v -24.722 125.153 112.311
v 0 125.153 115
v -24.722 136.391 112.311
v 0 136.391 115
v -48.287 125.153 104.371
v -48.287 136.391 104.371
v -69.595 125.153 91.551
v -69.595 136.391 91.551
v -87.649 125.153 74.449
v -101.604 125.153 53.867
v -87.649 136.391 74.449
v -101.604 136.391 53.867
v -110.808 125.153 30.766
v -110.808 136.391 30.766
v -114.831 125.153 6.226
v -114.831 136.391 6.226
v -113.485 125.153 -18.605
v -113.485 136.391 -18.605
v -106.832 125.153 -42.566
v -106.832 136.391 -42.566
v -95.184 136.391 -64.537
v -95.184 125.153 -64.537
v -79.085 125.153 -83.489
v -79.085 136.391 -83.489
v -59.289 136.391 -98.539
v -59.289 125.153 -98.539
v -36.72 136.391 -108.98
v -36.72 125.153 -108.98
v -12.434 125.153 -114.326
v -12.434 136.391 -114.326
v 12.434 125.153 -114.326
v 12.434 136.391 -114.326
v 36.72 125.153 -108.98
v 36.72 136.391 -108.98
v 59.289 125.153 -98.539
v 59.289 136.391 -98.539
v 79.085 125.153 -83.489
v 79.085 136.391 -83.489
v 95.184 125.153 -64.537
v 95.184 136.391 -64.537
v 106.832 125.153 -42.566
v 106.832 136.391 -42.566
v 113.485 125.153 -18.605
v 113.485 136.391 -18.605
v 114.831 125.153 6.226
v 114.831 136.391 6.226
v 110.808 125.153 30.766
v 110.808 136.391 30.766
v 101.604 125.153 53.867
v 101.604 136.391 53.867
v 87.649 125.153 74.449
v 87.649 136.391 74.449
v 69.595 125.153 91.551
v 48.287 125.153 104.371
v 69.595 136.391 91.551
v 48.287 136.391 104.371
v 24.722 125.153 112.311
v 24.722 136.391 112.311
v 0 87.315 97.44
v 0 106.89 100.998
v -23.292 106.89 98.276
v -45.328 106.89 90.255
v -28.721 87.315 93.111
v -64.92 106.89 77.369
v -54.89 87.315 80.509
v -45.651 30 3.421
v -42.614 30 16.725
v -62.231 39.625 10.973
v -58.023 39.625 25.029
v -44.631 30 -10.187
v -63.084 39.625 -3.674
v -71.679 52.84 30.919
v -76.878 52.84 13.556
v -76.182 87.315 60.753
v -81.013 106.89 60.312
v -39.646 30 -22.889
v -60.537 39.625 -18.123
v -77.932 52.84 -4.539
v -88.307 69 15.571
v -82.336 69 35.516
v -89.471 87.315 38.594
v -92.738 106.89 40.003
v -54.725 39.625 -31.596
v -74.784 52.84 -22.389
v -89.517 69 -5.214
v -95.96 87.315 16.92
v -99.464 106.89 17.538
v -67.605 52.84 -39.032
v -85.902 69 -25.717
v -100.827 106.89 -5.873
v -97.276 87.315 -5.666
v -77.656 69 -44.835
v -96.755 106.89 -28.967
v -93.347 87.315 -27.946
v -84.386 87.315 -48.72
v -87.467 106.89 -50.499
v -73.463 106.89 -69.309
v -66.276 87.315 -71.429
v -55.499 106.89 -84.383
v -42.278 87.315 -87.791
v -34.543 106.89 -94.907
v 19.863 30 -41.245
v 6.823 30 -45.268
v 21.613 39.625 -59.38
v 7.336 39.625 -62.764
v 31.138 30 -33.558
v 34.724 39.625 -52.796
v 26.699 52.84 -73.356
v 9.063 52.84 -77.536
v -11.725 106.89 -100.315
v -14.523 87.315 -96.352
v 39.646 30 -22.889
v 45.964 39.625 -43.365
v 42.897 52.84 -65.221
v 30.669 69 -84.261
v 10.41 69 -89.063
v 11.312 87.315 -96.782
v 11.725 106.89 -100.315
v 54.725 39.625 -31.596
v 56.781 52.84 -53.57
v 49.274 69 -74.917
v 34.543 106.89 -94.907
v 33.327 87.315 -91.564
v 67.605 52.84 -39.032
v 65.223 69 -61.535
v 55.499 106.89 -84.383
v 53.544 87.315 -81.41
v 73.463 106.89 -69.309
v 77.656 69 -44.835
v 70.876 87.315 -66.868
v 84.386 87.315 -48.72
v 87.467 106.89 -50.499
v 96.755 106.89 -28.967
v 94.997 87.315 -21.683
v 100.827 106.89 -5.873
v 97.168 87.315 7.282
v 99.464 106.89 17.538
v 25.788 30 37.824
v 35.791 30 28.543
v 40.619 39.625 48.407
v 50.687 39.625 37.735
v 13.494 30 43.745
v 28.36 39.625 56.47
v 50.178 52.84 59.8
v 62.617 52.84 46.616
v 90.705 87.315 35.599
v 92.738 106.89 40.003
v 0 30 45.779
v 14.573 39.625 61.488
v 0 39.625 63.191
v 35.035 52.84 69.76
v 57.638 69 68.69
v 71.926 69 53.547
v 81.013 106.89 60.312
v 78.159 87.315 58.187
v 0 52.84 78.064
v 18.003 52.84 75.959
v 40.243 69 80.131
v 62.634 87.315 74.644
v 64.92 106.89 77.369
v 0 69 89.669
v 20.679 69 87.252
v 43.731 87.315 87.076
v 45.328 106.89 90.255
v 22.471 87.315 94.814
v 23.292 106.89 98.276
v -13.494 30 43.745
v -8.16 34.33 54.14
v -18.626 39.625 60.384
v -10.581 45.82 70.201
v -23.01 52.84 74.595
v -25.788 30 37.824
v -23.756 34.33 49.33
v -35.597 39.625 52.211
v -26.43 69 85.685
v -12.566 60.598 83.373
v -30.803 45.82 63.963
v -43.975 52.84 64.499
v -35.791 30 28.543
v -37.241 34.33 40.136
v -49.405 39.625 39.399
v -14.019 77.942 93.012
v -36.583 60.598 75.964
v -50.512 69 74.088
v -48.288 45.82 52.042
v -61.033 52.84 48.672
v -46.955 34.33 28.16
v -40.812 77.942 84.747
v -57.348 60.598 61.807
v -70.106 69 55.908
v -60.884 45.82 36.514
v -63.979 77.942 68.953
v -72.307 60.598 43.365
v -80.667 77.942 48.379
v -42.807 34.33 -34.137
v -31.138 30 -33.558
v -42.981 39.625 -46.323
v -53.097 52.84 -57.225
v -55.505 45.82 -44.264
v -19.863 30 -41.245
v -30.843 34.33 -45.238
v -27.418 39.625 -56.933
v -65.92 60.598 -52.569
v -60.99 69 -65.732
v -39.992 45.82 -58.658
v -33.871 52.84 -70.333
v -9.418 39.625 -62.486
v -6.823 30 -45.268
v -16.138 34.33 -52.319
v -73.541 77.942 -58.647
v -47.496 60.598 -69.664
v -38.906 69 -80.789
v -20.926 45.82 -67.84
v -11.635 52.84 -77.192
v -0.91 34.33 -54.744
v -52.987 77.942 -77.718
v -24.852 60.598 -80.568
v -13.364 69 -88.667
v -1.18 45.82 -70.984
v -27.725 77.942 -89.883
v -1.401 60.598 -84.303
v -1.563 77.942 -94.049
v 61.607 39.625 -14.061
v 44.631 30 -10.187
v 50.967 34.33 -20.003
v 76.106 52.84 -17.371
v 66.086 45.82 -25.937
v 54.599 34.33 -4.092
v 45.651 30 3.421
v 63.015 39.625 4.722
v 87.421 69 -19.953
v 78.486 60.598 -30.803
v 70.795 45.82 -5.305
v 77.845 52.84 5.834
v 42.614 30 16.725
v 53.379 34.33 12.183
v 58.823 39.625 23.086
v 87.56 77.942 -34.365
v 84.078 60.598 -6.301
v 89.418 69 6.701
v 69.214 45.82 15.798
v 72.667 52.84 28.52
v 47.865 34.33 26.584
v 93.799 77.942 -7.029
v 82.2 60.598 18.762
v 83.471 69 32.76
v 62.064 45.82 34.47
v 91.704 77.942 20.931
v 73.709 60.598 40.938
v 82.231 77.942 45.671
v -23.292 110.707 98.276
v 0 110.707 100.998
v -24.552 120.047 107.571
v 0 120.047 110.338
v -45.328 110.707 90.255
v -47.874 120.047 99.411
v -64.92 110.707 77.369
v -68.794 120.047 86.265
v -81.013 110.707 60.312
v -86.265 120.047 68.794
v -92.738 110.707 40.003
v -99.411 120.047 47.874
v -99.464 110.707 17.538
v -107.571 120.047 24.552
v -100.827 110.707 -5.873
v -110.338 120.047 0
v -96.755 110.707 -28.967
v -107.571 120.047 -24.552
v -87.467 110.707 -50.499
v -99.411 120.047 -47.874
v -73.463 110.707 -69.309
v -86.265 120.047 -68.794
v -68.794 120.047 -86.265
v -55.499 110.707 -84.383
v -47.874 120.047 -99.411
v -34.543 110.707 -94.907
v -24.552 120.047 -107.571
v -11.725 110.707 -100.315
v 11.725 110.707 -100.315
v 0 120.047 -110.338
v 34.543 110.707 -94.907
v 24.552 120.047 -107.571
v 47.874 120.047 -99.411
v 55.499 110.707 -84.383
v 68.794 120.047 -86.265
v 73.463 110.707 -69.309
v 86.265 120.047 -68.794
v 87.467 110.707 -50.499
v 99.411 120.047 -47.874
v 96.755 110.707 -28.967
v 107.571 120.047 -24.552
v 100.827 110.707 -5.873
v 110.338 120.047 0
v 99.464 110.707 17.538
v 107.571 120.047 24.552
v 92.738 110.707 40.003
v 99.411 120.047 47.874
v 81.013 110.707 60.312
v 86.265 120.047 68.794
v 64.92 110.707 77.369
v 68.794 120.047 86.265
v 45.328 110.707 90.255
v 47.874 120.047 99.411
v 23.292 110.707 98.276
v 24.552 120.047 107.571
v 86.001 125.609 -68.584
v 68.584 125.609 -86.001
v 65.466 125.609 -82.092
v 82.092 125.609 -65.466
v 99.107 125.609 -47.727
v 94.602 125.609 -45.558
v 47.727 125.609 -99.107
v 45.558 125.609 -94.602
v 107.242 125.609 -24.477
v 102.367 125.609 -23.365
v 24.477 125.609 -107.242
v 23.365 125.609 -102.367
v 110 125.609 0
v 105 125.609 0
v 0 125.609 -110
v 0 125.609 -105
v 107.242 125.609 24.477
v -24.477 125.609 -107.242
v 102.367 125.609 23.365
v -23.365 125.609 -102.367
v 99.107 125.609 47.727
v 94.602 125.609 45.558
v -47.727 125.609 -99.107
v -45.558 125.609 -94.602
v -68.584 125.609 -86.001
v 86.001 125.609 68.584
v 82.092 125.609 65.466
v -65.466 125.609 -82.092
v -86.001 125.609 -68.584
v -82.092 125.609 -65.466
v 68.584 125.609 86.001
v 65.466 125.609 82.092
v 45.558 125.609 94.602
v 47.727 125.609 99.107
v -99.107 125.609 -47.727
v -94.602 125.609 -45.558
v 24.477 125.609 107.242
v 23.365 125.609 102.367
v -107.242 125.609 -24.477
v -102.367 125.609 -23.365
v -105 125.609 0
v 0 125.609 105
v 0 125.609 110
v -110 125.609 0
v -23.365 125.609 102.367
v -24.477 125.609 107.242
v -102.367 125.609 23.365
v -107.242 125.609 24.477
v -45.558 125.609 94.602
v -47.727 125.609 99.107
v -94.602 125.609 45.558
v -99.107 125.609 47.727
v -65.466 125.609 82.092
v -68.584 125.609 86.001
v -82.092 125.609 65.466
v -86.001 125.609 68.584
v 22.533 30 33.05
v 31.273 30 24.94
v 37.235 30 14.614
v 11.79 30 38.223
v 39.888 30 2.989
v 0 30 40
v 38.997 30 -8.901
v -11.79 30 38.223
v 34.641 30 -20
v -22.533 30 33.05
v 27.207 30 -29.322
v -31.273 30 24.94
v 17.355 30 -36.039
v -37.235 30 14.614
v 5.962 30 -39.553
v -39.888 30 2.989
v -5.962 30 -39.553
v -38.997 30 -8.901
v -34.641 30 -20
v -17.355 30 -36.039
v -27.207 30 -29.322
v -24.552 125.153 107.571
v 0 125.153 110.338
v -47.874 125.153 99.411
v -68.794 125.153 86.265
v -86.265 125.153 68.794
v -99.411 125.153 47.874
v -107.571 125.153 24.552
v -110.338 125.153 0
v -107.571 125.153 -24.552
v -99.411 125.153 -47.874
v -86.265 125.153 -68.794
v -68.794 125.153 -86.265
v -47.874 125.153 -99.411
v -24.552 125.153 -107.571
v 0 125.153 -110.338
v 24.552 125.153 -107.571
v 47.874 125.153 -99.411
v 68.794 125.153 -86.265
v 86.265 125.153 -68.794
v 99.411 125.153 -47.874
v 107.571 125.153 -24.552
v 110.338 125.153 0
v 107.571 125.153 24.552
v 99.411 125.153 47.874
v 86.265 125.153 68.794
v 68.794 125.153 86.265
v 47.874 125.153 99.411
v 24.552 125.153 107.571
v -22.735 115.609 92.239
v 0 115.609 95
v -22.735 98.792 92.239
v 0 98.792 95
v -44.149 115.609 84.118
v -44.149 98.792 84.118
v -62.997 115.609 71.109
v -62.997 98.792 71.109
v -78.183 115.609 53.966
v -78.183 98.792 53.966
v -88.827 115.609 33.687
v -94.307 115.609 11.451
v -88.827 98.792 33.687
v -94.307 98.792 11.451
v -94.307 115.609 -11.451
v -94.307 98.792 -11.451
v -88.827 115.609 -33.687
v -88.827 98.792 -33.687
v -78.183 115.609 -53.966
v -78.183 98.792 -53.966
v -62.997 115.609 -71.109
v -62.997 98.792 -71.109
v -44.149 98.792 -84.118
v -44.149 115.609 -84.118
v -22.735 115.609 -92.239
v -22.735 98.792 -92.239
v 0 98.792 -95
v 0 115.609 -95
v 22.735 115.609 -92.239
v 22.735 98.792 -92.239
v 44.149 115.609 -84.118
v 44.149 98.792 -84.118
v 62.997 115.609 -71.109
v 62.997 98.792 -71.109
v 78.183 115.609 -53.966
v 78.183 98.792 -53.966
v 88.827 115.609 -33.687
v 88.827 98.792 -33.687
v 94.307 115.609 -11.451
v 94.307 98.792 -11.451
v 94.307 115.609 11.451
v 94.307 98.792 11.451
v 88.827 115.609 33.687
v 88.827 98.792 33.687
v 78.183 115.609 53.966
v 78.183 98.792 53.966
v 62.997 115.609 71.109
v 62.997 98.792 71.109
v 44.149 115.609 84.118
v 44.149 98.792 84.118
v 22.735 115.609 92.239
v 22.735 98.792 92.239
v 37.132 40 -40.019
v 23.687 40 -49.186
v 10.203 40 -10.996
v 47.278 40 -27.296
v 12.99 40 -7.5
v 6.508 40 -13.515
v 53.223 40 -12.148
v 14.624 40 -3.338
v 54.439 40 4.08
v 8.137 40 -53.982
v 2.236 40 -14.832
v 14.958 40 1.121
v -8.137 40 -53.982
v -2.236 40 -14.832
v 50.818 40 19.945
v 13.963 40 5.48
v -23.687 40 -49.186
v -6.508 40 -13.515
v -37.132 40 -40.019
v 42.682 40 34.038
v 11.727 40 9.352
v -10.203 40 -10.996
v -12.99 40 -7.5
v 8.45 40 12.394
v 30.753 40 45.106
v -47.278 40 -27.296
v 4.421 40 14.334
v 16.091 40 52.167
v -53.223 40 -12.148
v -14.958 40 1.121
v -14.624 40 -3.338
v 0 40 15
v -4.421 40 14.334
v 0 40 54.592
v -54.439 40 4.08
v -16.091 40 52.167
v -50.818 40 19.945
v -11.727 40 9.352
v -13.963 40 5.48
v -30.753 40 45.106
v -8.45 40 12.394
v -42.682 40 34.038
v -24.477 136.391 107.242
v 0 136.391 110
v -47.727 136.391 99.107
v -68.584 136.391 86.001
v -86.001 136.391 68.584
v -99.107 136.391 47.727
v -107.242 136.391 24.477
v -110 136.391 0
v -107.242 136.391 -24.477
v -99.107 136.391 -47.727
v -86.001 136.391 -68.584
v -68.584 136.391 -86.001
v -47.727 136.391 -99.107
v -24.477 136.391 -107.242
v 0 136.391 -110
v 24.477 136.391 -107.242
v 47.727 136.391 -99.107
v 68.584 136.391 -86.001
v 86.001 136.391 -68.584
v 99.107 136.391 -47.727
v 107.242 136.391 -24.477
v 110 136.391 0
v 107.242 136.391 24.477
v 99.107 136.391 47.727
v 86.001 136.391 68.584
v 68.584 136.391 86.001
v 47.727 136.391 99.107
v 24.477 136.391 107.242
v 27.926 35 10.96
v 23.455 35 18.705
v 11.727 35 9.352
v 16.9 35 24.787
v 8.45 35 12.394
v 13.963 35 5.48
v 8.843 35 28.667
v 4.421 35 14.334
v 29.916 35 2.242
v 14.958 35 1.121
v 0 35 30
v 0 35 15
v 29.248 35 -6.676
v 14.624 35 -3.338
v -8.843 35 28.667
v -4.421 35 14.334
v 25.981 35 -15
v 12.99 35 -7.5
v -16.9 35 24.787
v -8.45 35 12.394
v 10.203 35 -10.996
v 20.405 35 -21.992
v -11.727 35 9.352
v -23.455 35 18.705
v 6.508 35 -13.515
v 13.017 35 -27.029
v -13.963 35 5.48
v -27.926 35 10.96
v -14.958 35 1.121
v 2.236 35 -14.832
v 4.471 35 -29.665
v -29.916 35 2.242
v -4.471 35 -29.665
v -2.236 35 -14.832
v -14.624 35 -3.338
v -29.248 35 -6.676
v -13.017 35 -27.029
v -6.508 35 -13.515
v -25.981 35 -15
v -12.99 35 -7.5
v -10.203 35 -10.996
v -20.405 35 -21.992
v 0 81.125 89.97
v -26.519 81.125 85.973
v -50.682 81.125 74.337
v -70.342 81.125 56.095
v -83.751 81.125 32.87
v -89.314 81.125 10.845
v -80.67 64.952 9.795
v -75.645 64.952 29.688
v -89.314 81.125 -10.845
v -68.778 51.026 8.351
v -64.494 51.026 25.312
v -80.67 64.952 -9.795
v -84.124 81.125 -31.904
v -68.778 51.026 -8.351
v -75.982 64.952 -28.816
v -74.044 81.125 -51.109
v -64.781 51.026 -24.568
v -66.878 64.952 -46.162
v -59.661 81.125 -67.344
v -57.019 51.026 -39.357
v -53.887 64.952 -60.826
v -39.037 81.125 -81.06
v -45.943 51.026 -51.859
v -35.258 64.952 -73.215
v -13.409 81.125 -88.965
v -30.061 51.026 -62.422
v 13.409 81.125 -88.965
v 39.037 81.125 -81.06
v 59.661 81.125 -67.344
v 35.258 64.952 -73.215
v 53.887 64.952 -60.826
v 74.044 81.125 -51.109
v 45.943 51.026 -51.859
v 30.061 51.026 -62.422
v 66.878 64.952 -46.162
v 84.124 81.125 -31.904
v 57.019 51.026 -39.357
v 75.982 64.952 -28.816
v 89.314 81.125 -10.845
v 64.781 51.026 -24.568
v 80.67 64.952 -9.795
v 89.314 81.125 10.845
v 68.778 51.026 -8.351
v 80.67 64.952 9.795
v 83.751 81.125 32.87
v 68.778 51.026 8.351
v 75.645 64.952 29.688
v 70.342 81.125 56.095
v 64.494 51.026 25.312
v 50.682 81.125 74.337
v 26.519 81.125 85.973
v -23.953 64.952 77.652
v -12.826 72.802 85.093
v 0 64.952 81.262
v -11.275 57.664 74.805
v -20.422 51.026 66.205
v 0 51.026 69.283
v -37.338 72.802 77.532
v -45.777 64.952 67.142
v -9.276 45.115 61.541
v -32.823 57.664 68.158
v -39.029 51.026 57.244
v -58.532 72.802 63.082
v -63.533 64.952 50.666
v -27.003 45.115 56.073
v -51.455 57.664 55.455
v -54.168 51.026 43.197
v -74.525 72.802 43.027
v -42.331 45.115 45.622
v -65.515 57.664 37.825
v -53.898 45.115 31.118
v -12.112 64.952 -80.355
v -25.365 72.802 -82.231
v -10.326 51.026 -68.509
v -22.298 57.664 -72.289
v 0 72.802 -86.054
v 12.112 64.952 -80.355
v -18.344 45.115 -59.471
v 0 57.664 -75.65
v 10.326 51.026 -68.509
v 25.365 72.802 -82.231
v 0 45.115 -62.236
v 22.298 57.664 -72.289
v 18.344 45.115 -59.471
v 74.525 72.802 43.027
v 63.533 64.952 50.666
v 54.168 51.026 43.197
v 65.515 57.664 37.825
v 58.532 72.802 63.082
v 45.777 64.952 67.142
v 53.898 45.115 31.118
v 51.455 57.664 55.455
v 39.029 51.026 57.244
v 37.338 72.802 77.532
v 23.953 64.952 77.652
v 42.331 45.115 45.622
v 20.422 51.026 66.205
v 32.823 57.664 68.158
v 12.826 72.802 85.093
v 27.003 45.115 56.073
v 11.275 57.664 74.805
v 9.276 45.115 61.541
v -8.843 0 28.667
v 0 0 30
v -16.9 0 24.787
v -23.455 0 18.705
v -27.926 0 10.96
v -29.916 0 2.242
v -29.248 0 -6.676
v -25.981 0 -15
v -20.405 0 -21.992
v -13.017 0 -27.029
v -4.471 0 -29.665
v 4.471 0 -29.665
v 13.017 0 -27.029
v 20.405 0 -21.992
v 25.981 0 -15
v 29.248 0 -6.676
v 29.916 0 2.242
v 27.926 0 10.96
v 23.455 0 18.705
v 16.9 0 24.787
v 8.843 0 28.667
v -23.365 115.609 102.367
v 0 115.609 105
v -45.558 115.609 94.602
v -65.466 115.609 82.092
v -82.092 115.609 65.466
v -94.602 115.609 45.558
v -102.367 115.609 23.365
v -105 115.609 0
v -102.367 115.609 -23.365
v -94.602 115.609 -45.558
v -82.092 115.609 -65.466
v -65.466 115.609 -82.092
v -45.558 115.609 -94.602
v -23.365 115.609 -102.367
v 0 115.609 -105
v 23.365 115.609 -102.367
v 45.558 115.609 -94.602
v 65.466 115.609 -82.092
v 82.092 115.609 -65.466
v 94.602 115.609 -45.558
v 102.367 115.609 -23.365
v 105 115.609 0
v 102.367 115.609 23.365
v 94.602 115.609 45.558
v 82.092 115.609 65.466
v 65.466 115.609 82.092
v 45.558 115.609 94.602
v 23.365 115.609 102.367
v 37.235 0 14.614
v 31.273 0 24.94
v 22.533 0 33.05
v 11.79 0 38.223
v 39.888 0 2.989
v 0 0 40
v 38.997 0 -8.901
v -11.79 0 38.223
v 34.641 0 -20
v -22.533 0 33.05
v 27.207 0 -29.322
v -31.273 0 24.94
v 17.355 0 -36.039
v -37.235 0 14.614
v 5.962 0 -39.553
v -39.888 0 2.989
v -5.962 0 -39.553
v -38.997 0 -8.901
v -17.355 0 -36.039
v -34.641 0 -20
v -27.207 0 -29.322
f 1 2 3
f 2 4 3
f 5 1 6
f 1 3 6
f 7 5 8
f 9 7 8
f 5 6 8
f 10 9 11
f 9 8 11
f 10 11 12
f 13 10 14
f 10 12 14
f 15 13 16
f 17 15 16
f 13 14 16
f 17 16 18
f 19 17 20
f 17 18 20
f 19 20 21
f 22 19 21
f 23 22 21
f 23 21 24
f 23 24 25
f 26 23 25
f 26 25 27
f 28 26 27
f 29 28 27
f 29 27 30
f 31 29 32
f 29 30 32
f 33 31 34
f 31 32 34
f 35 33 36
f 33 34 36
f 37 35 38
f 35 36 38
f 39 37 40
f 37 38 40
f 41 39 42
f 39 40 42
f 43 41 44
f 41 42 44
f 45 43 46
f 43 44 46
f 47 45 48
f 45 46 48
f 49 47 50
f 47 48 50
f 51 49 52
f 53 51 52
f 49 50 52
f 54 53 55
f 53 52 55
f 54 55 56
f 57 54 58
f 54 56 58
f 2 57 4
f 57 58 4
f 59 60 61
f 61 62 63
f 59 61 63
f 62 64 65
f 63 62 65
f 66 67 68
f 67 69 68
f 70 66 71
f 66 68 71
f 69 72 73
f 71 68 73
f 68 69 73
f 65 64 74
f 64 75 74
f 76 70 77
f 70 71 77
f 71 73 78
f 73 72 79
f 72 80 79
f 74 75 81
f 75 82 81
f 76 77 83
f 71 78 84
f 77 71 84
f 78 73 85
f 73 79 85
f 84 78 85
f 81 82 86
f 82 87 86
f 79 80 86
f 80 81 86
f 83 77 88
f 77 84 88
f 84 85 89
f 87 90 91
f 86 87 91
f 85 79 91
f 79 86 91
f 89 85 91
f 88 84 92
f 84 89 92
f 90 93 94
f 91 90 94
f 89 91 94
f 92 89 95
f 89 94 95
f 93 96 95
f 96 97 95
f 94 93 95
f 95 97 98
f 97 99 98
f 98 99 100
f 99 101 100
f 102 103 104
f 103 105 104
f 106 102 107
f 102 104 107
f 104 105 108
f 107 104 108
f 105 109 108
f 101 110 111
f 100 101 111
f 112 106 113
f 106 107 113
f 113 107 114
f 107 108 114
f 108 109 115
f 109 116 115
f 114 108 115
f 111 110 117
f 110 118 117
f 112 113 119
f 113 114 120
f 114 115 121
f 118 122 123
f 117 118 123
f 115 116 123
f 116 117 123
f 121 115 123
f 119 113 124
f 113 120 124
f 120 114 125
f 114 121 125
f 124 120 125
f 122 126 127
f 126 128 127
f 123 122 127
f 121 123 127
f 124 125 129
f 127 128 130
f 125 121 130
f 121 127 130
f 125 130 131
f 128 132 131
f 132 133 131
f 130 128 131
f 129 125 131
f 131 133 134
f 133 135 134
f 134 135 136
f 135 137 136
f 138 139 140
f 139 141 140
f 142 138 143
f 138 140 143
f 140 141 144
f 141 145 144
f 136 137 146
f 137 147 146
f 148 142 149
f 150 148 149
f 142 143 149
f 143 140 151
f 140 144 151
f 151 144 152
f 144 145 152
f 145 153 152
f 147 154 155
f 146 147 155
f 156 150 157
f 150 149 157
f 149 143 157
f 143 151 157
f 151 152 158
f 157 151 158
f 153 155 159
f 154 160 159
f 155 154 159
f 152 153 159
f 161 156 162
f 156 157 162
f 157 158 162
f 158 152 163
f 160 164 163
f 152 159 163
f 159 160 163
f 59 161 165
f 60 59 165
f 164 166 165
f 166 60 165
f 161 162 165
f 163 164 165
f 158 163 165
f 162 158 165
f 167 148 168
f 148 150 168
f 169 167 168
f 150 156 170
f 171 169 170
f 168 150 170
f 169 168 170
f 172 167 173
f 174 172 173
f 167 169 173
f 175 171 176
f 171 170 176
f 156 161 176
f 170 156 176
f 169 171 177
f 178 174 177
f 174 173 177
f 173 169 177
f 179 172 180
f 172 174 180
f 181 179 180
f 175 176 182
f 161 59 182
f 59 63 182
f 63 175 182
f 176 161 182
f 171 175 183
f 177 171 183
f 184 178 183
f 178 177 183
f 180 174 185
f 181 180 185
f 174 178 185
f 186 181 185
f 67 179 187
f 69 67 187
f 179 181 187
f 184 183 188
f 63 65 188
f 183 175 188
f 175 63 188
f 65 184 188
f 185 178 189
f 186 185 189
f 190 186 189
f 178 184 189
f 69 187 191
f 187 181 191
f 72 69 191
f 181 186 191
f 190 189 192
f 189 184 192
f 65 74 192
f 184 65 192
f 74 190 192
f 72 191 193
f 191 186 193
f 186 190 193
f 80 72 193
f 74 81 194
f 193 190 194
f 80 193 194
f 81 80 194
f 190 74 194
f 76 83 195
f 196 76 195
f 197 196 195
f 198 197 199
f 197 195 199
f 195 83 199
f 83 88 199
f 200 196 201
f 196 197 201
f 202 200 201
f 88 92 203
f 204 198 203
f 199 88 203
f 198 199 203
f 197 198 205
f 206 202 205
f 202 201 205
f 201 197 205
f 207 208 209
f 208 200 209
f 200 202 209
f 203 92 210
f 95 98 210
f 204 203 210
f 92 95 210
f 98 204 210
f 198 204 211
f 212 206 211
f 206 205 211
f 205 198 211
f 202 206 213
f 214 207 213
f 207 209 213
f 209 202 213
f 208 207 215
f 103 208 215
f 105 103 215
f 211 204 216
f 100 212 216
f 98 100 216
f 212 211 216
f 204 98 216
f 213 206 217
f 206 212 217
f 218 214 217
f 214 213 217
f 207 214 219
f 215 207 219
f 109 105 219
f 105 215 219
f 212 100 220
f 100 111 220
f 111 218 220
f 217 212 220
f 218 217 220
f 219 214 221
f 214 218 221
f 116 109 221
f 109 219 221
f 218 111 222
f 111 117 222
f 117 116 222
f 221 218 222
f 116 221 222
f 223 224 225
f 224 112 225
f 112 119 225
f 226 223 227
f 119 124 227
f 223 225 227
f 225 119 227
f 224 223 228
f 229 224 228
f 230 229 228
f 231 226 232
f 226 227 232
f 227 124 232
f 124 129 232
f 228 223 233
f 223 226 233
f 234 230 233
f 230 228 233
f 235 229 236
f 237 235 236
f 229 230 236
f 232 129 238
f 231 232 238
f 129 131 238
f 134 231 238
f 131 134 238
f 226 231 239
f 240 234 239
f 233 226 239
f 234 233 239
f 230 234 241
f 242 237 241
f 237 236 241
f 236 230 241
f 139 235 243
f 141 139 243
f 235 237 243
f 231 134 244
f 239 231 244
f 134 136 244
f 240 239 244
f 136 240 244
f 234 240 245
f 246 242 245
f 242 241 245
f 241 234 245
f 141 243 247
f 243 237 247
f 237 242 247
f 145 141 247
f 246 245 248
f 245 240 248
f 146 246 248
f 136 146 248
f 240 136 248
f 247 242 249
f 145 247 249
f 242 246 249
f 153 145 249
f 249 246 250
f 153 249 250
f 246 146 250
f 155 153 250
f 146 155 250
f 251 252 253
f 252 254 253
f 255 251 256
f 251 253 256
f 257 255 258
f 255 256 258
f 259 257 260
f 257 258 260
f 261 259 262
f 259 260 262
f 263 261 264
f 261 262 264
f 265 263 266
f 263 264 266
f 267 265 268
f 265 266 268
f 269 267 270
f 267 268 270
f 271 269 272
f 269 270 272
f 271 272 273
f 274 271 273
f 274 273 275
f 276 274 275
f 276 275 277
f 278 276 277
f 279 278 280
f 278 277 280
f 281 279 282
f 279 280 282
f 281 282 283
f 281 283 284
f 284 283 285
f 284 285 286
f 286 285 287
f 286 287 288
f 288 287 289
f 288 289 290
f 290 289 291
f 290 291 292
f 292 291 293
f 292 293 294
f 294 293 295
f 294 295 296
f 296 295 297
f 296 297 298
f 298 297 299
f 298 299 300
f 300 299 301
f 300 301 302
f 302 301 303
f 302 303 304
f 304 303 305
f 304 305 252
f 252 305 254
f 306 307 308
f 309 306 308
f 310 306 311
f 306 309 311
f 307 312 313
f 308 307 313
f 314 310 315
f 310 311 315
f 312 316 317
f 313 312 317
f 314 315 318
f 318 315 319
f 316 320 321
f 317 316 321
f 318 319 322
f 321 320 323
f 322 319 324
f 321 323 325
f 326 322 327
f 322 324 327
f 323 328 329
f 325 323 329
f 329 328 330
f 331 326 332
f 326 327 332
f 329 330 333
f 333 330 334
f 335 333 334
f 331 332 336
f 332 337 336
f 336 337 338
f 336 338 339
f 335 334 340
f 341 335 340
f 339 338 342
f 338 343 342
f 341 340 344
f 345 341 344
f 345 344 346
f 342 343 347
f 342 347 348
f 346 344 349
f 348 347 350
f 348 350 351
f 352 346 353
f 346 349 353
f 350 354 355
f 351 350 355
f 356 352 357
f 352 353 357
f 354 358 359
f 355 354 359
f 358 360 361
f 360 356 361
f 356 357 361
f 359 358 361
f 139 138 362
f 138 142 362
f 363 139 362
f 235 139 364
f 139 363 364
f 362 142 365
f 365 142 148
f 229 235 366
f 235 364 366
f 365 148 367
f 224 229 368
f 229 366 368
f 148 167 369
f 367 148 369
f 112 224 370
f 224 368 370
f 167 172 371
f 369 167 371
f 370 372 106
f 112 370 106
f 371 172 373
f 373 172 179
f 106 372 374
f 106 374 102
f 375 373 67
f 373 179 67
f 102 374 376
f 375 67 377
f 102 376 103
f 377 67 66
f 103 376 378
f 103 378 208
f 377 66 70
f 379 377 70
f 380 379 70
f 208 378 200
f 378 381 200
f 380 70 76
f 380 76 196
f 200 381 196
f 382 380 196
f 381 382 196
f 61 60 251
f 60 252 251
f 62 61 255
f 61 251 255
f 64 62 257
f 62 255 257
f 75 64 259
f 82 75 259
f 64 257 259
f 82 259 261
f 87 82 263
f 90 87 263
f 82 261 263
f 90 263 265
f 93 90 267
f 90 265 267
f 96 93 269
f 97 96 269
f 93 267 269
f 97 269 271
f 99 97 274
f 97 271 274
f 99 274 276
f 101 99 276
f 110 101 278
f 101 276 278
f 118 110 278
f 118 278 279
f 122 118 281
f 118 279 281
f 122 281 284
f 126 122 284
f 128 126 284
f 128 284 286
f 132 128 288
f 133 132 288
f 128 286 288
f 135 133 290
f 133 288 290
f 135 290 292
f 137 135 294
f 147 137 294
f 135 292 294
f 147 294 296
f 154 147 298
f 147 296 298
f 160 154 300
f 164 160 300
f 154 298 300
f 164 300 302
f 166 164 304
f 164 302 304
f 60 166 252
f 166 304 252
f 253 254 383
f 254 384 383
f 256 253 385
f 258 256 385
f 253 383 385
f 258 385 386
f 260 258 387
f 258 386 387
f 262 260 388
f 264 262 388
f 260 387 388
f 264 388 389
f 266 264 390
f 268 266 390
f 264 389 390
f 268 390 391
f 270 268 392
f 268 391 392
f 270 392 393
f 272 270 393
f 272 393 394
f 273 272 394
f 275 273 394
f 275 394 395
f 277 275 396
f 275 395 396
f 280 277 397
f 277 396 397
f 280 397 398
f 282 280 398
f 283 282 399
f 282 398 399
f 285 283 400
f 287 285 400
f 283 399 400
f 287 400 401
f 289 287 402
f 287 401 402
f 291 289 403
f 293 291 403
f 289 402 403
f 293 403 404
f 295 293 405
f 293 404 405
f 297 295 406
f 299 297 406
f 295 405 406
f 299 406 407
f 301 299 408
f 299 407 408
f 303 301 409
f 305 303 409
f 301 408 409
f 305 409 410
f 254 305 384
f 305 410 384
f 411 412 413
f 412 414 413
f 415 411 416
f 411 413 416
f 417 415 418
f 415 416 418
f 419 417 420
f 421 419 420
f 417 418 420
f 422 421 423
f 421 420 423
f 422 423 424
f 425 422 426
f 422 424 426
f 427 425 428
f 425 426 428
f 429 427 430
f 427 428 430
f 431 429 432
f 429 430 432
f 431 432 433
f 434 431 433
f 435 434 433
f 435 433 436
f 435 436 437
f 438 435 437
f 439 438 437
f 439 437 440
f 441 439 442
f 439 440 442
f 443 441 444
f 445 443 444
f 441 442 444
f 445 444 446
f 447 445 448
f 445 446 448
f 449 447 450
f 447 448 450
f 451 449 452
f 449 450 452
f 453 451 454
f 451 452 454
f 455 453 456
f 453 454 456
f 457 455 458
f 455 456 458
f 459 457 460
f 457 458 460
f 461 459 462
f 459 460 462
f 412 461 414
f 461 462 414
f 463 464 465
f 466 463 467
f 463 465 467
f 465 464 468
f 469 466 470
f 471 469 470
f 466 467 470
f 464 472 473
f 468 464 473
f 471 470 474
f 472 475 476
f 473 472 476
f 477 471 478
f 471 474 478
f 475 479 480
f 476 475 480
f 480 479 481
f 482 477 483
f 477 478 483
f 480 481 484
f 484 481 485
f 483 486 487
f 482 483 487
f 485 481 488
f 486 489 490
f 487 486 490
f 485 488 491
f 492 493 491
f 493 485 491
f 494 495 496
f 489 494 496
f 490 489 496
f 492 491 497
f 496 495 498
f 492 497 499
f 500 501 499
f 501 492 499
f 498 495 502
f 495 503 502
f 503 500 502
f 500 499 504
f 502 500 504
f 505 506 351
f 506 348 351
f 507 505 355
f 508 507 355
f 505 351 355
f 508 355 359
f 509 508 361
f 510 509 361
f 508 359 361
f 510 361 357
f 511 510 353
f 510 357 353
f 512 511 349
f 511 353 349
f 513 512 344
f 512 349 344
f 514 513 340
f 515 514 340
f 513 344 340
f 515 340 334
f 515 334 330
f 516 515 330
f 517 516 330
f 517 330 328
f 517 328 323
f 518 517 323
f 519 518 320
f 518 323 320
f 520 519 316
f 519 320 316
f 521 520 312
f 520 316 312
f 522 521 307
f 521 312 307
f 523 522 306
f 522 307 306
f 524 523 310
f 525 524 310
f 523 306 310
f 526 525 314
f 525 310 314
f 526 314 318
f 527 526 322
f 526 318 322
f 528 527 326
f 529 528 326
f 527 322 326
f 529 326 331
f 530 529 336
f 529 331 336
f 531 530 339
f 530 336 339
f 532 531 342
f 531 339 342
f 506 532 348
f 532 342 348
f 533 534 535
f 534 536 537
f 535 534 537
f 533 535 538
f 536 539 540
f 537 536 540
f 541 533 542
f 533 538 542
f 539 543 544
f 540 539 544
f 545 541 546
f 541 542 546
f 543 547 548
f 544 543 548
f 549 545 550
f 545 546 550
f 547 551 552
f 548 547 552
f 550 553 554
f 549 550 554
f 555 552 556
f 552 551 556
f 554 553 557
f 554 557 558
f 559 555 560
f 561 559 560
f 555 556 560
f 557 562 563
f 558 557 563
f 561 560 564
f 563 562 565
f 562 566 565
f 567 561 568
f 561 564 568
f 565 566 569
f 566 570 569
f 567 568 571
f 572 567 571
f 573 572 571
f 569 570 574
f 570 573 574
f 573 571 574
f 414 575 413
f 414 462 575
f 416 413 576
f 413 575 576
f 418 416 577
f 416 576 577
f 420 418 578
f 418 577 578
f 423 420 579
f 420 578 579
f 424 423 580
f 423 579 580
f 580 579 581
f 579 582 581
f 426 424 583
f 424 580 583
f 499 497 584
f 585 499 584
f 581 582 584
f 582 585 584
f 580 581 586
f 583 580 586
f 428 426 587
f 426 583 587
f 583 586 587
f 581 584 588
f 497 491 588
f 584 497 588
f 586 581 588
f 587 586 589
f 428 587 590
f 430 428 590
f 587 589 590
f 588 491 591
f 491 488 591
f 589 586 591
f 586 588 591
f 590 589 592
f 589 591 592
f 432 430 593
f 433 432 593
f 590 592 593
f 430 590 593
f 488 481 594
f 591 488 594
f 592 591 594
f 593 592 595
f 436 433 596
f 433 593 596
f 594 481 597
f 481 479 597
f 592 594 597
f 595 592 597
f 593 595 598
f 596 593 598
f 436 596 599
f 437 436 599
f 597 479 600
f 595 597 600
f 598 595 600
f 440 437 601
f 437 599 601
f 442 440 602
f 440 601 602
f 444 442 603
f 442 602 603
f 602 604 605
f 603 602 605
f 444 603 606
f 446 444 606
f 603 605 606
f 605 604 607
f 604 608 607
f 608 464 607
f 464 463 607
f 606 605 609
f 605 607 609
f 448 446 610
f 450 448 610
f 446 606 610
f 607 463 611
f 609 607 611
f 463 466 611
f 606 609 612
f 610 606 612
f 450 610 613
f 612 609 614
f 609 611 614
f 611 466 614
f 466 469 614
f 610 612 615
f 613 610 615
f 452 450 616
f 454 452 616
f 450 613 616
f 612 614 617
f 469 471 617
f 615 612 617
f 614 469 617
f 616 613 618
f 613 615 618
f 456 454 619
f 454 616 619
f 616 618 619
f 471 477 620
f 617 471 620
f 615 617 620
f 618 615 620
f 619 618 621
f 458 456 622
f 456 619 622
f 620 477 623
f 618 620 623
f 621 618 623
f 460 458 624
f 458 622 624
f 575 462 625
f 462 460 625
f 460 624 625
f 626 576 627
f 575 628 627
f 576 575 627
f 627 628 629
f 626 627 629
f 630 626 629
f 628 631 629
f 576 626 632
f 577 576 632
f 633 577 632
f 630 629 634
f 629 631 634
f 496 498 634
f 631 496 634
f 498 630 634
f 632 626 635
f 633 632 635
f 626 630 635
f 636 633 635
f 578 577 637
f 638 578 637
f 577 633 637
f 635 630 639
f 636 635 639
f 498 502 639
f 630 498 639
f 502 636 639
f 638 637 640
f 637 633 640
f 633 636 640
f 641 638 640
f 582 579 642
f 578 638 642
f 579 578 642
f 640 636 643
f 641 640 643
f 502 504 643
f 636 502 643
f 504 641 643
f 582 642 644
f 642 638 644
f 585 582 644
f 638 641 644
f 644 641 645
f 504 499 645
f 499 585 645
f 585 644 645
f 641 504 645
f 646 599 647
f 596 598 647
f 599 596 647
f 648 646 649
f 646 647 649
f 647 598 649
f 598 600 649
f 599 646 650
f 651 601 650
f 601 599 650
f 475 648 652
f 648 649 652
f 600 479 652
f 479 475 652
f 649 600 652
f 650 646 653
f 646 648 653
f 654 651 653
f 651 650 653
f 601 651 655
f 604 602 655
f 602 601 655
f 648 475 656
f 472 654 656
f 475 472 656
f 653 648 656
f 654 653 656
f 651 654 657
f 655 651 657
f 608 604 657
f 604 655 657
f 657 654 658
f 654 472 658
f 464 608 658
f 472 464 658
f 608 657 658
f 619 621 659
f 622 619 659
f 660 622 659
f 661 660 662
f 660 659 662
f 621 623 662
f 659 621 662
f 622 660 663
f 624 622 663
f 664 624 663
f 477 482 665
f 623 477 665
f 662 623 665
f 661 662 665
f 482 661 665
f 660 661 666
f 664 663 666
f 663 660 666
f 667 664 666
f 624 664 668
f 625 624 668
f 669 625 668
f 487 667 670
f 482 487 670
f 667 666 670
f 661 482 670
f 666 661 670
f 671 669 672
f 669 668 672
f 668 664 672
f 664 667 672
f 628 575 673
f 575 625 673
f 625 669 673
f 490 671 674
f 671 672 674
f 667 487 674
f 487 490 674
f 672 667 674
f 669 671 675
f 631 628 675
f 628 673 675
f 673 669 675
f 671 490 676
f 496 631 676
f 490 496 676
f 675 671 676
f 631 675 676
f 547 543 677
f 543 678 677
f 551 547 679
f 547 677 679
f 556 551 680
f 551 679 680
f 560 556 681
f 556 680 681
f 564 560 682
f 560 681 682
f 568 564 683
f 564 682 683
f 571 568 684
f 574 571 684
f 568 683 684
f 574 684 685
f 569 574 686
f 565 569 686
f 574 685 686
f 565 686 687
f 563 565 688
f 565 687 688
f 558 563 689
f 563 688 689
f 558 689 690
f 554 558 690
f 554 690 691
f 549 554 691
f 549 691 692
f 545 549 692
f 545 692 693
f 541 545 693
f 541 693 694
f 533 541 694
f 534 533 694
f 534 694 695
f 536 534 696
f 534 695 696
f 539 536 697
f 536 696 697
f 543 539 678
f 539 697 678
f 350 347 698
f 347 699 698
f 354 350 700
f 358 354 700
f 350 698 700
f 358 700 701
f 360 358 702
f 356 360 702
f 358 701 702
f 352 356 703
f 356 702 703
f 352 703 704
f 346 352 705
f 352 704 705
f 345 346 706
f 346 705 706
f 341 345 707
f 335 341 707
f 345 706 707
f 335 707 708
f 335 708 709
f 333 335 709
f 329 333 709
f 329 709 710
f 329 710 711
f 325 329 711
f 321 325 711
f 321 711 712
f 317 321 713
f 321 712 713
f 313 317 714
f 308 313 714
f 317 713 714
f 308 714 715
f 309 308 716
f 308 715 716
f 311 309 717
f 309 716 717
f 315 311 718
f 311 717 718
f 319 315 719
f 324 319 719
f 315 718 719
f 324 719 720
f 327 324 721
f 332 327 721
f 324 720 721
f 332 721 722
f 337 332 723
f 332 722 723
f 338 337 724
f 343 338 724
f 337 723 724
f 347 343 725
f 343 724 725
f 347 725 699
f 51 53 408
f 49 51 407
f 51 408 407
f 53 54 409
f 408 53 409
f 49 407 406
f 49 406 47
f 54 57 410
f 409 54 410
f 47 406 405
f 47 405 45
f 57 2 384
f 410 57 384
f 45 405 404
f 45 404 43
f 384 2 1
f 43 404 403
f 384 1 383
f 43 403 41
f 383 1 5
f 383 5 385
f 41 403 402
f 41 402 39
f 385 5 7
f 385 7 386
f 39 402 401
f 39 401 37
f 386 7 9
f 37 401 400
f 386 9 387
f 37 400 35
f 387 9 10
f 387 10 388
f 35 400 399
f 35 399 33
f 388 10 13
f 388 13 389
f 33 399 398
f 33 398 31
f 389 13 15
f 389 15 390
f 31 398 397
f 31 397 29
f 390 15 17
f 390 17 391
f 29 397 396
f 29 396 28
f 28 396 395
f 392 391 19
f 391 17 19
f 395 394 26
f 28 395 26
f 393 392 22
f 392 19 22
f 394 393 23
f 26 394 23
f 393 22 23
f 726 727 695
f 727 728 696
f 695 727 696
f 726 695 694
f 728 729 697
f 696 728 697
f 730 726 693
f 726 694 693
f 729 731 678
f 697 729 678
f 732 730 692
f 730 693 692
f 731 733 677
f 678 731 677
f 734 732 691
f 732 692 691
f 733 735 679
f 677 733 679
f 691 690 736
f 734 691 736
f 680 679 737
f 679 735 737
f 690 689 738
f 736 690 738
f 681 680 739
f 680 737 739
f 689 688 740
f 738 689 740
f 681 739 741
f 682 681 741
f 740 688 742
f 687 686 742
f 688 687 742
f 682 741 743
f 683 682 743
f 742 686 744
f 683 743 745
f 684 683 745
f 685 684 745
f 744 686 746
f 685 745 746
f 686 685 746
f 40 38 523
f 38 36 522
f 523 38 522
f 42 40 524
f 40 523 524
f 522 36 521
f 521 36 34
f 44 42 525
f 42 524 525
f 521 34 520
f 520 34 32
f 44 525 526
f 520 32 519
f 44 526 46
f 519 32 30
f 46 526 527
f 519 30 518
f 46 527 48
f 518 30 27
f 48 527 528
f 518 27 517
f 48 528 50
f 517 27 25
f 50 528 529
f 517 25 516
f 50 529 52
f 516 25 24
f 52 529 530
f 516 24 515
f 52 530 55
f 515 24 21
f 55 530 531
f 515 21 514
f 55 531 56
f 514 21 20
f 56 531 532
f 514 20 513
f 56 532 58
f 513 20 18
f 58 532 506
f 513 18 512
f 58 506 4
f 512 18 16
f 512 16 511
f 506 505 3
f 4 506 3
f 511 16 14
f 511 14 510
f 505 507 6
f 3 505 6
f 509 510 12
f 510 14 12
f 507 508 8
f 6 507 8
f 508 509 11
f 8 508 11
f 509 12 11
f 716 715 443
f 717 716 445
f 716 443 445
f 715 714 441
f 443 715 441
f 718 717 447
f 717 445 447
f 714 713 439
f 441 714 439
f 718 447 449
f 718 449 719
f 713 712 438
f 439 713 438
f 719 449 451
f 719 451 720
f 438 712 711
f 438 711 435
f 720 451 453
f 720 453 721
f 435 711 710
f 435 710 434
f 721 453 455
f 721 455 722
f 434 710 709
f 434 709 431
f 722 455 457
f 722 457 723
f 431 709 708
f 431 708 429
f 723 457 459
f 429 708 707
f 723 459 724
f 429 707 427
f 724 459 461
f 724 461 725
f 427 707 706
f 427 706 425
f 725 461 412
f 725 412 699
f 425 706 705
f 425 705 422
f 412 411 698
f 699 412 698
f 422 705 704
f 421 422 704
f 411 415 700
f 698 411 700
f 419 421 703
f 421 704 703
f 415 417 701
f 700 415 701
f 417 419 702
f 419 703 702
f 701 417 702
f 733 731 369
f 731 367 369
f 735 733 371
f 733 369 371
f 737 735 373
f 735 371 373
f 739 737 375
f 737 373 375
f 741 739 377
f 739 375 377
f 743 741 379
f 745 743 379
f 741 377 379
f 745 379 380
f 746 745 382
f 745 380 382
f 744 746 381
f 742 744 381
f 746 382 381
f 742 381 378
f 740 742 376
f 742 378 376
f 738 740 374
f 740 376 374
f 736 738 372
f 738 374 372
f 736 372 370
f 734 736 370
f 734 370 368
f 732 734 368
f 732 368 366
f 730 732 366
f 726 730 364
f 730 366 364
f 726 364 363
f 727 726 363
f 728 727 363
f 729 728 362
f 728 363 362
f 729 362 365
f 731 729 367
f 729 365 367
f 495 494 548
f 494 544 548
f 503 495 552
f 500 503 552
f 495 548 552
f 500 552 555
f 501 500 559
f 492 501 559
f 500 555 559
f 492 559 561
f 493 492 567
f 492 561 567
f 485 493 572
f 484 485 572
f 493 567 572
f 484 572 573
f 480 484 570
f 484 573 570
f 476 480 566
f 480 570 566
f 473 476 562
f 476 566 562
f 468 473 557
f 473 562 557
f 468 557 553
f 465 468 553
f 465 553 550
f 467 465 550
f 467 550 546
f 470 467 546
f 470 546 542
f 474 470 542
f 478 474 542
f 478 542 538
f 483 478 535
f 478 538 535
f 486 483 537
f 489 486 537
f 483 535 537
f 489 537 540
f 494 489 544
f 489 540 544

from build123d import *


with BuildPart() as part:
    # Esquisse1 → Révolution1 (revolve)
    with BuildSketch(Plane.XY, mode=Mode.PRIVATE) as r_volution1_sk:
        with BuildLine():
            Line((30, 35), (30, 0))
            Line((30, 0), (40, 0))
            Line((40, 0), (40, 30))
            Line((40, 30), (45.778995681, 30))
            ThreePointArc((45.778995681, 30), (84.314223985, 60.59839034), (100.998111547, 106.889568849))
            Line((100.998111547, 106.889568849), (100.998111547, 110.707348445))
            Line((100.998111547, 110.707348445), (110.337667118, 120.046904015))
            Line((110.337667118, 120.046904015), (110.337667118, 125.152560563))
            Line((110.337667118, 125.152560563), (115, 125.152560563))
            Line((115, 125.152560563), (115, 136.391053218))
            Line((115, 136.391053218), (110, 136.391053218))
            Line((110, 136.391053218), (110, 125.608667149))
            Line((110, 125.608667149), (105, 125.608667149))
            Line((105, 125.608667149), (105, 115.608667149))
            Line((105, 115.608667149), (95, 115.608667149))
            Line((95, 115.608667149), (95, 98.791773656))
            ThreePointArc((95, 98.791773656), (81.262363234, 64.951540679), (54.592067969, 40))
            Line((54.592067969, 40), (15, 40))
            Line((15, 40), (15, 35))
            Line((15, 35), (30, 35))
        make_face()
    revolve(r_volution1_sk.sketch.rotate(Axis((0, 50.463576159, 0), (0, -1, 0)), 90), axis=Axis((0, 50.463576159, 0), (0, -1, 0)))


solid = part.part
